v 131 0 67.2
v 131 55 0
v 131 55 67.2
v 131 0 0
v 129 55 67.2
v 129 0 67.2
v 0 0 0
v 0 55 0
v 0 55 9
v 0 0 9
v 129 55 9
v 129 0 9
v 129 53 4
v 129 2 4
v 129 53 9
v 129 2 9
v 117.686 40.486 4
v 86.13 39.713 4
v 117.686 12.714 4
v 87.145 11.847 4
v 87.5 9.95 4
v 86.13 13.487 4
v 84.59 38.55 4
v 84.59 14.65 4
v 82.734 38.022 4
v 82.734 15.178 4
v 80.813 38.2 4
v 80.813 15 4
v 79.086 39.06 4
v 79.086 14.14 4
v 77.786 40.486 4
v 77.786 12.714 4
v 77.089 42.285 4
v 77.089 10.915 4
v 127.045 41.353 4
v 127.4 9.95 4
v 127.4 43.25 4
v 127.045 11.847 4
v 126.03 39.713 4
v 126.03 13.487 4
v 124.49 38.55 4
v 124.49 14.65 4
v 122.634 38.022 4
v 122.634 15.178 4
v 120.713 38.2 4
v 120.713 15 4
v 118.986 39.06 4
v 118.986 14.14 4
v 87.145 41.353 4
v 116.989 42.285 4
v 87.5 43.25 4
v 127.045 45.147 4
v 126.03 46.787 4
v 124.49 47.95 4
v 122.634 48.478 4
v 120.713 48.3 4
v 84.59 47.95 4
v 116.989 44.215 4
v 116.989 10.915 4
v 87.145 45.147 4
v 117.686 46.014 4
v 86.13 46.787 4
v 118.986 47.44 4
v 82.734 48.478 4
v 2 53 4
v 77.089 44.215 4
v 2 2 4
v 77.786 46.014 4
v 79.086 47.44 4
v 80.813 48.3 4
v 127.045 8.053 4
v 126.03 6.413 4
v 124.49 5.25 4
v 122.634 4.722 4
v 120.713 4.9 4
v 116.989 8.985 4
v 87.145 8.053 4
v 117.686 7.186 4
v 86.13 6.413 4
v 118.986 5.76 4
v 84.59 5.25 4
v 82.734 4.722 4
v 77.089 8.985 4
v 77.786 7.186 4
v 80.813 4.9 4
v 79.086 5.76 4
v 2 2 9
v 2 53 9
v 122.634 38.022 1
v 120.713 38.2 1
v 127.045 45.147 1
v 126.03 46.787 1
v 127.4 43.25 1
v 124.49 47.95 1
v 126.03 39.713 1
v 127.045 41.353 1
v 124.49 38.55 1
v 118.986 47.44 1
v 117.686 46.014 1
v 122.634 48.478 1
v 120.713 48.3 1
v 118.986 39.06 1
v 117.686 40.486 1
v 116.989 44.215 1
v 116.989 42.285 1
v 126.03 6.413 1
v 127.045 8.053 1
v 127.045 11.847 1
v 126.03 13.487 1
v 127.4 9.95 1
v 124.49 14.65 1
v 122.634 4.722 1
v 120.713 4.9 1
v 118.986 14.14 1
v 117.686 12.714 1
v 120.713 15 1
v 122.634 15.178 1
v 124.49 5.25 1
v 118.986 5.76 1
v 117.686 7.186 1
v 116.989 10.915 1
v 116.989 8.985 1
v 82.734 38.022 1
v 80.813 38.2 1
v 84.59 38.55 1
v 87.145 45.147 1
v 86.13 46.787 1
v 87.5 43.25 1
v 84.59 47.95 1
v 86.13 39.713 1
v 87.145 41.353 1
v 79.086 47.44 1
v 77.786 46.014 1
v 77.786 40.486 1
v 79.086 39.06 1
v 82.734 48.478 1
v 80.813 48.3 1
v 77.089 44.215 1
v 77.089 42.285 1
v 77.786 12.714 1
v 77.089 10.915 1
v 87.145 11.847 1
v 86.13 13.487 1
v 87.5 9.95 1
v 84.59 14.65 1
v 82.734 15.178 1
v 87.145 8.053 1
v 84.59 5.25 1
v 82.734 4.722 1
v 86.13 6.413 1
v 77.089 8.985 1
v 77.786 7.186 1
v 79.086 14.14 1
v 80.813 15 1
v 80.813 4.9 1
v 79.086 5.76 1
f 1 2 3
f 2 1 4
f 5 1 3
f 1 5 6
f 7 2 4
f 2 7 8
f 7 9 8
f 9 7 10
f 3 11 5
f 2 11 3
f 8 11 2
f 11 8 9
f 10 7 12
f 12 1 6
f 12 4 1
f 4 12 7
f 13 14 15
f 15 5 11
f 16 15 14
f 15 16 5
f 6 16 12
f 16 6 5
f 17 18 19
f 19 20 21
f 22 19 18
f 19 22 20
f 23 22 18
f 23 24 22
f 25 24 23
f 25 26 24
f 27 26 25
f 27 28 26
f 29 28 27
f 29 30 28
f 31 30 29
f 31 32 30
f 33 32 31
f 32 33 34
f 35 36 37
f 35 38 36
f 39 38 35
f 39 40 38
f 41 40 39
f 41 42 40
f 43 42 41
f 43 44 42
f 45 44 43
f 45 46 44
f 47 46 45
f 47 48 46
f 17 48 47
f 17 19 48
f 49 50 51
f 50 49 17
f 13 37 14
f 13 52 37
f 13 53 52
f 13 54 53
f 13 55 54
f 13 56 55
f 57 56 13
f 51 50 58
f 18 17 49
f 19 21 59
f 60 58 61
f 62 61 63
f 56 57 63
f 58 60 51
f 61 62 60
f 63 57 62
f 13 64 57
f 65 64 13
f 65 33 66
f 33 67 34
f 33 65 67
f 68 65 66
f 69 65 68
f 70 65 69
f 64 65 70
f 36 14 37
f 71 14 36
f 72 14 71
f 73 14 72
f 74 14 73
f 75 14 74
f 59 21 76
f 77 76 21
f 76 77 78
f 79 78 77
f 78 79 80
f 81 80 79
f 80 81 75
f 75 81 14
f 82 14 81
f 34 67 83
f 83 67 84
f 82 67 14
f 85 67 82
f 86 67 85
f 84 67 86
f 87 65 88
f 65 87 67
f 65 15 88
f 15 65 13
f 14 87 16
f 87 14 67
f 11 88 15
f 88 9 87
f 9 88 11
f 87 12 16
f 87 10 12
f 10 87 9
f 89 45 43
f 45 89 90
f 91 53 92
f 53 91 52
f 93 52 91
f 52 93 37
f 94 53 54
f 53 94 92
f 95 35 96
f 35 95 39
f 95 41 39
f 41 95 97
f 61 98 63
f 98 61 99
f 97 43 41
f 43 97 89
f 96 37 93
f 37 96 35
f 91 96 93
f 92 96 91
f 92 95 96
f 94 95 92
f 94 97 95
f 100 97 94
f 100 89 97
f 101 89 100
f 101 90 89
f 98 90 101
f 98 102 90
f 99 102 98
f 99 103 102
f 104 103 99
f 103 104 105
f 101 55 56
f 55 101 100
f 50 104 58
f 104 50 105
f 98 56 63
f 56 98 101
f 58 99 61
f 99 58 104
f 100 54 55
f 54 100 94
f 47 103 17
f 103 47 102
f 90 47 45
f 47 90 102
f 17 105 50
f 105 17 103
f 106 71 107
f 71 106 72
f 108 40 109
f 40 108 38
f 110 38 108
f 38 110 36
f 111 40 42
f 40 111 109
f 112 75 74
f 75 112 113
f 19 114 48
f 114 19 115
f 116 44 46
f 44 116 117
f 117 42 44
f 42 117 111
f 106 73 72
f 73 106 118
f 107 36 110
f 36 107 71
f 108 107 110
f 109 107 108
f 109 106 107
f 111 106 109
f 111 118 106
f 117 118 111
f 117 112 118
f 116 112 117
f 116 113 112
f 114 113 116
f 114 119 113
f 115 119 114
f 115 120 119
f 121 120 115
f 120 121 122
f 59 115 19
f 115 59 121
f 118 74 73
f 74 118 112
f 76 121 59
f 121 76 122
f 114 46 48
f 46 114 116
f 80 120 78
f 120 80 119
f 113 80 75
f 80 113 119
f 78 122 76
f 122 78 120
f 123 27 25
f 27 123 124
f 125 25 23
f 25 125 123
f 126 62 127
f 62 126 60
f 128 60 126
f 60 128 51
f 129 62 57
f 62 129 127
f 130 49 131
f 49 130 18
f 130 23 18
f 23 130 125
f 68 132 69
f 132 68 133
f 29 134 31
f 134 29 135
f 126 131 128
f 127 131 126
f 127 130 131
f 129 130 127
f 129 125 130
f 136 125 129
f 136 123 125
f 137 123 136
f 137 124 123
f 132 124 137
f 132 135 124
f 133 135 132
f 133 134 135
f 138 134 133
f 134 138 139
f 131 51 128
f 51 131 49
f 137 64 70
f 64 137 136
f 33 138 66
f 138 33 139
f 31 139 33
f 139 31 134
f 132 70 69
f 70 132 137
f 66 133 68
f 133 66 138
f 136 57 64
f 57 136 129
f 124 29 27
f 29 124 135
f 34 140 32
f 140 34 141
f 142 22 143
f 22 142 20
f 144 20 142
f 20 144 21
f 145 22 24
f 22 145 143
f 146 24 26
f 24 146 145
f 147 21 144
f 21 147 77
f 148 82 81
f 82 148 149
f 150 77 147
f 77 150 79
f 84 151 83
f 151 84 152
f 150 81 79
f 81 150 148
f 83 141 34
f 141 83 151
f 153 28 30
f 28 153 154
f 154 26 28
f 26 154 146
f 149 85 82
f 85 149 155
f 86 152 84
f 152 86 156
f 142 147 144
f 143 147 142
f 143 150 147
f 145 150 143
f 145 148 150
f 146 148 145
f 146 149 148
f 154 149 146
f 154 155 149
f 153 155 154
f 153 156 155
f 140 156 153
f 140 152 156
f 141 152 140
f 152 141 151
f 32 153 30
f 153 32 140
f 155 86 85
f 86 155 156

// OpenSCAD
Length = 131;
Width = 55;
Height = 67.2;
edge_thickness = 2;
bottom_thickness = 4;
edge_height = 5;

mag_height = 3 + 1; // The 1 is to prevent clipping
mag_radius = 5.25;

difference() {
    // The outer shell of the box
    cube([Length, Width, Height]);
    
    translate([edge_thickness, edge_thickness, bottom_thickness]) {
        cube([Length-(edge_thickness*2), Width-(edge_thickness*2), Height]);
    }

    // Prevent clipping by translating y -1 and making width +2
    translate([0, -1, edge_height + bottom_thickness]) {
        cube([Length-edge_thickness, Width + 2, Height]);
    }

    // Add in the magnent spots
    translate([Length - edge_thickness - 1.6 - mag_radius, 35 + edge_thickness + mag_radius + 1, bottom_thickness - mag_height + 1]) {
        cylinder(mag_height, mag_radius, mag_radius);
    }

    translate([Length - edge_thickness - 1.6 - mag_radius, edge_thickness + 1.7 + mag_radius + 1, bottom_thickness - mag_height + 1]) {
        cylinder(mag_height, mag_radius, mag_radius);
    }

    translate([Length - 41.5 - (edge_thickness + mag_radius), 35 + edge_thickness + mag_radius + 1, bottom_thickness - mag_height + 1]) {
        cylinder(mag_height, mag_radius, mag_radius);
    }

    translate([Length - 41.5 - (edge_thickness + mag_radius), edge_thickness + 1.7 + mag_radius + 1, bottom_thickness - mag_height + 1]) {
        cylinder(mag_height, mag_radius, mag_radius);
    }
}
